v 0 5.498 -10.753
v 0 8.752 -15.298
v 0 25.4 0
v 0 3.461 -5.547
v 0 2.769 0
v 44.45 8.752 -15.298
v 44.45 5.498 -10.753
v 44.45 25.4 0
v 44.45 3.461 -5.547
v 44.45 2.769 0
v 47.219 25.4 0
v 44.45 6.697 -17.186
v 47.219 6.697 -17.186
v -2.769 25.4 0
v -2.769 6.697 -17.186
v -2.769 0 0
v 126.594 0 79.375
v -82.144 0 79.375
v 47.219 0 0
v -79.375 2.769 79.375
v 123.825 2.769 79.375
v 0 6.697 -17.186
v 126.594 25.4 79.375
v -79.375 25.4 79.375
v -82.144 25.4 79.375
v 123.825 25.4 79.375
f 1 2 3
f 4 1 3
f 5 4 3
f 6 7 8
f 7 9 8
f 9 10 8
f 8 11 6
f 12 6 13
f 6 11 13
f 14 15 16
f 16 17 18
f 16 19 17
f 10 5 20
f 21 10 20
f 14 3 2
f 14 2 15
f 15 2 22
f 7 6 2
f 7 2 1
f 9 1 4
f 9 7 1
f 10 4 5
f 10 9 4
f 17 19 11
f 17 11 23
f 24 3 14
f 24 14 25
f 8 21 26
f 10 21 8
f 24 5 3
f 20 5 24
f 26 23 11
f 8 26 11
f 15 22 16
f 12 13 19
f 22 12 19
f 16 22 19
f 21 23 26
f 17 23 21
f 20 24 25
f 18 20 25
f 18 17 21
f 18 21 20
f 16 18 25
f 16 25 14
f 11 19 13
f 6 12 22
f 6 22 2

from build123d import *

# Parameters (mm, degrees)
BOSS_EXTRUDE1_DEPTH   = 2.7686
BOSS_EXTRUDE2_START   = -2.7686
BOSS_EXTRUDE2_DEPTH   = 25.4
BOSS_EXTRUDE2_2_DEPTH = 25.4
SKETCH4_W             = 2.7686
SKETCH4_H             = 25.4
BOSS_EXTRUDE3_DEPTH   = 25.4
CUT_EXTRUDE1_DEPTH    = 2.7686
BOSS_EXTRUDE6_DEPTH   = 44.45
BOSS_EXTRUDE7_DEPTH   = 2.7686


with BuildPart() as part:
    # Sketch1 → Boss-Extrude1 (new body)
    with BuildSketch(Plane(origin=(0, 0, 0), x_dir=(1, 0, 0), z_dir=(0, 1, 0))):
        Polygon((0, 0), (44.45, 0), (123.825, -79.375), (-79.375, -79.375), align=None)
    extrude(amount=BOSS_EXTRUDE1_DEPTH)



with BuildPart() as body_2:
    # Sketch2 → Boss-Extrude2 (new body)
    with BuildSketch(Plane(origin=(0, 2.7686, 0), x_dir=(1, 0, 0), z_dir=(0, 1, 0)).offset(BOSS_EXTRUDE2_START)):
        Polygon((0, 0), (-79.375, -79.375), (-82.1436, -79.375), (-2.7686, 0), align=None)
    extrude(amount=BOSS_EXTRUDE2_DEPTH)


with BuildPart() as body_3:
    # Sketch2 → Boss-Extrude2 2 (new body)
    with BuildSketch(Plane(origin=(0, 2.7686, 0), x_dir=(1, 0, 0), z_dir=(0, 1, 0)).offset(BOSS_EXTRUDE2_START)):
        Polygon((44.45, 0), (47.2186, 0), (126.5936, -79.375), (123.825, -79.375), align=None)
    extrude(amount=BOSS_EXTRUDE2_2_DEPTH)


with BuildPart() as part_1:
    add(part.part)

    add(body_3.part)  # Boss-Extrude3 merges body 3
    # Sketch4 → Boss-Extrude3 (add)
    with BuildSketch(Plane(origin=(0, 0, 0), x_dir=(-1, 0, 0), z_dir=(0, 0, -1))):
        with Locations((-45.8343, 12.7)):
            Rectangle(SKETCH4_W, SKETCH4_H)
    extrude(amount=BOSS_EXTRUDE3_DEPTH)

    # Sketch5 → Cut-Extrude1 (cut)
    with BuildSketch(Plane(origin=(47.2186, 0, 0), x_dir=(0, 0, -1), z_dir=(1, 0, 0))):
        Polygon((17.186035514, 6.697089394), (0, 0), (25.4, 0), (25.4, 14.244871038), (25.4, 25.4), (0, 25.4), align=None)
    extrude(amount=-CUT_EXTRUDE1_DEPTH, mode=Mode.SUBTRACT)


    add(body_2.part)  # Boss-Extrude6 merges body 2
    # Sketch10 → Boss-Extrude6 (add)
    with BuildSketch(Plane.ZY.offset(-44.45)):
        with BuildLine():
            Line((-17.186035514, 6.697089394), (-15.298135688, 8.75161917))
            ThreePointArc((-15.298135688, 8.75161917), (-8.213243481, 4.317554379), (0, 2.7686))
            Line((0, 2.7686), (0, 0))
            Line((0, 0), (-17.186035514, 6.697089394))
        make_face()
    extrude(amount=BOSS_EXTRUDE6_DEPTH)

    # Sketch11 → Boss-Extrude7 (add)
    with BuildSketch(Plane.ZY):
        Polygon((0, 0), (0, 25.4), (-17.186035514, 6.697089394), align=None)
    extrude(amount=BOSS_EXTRUDE7_DEPTH)


solid = part_1.part
